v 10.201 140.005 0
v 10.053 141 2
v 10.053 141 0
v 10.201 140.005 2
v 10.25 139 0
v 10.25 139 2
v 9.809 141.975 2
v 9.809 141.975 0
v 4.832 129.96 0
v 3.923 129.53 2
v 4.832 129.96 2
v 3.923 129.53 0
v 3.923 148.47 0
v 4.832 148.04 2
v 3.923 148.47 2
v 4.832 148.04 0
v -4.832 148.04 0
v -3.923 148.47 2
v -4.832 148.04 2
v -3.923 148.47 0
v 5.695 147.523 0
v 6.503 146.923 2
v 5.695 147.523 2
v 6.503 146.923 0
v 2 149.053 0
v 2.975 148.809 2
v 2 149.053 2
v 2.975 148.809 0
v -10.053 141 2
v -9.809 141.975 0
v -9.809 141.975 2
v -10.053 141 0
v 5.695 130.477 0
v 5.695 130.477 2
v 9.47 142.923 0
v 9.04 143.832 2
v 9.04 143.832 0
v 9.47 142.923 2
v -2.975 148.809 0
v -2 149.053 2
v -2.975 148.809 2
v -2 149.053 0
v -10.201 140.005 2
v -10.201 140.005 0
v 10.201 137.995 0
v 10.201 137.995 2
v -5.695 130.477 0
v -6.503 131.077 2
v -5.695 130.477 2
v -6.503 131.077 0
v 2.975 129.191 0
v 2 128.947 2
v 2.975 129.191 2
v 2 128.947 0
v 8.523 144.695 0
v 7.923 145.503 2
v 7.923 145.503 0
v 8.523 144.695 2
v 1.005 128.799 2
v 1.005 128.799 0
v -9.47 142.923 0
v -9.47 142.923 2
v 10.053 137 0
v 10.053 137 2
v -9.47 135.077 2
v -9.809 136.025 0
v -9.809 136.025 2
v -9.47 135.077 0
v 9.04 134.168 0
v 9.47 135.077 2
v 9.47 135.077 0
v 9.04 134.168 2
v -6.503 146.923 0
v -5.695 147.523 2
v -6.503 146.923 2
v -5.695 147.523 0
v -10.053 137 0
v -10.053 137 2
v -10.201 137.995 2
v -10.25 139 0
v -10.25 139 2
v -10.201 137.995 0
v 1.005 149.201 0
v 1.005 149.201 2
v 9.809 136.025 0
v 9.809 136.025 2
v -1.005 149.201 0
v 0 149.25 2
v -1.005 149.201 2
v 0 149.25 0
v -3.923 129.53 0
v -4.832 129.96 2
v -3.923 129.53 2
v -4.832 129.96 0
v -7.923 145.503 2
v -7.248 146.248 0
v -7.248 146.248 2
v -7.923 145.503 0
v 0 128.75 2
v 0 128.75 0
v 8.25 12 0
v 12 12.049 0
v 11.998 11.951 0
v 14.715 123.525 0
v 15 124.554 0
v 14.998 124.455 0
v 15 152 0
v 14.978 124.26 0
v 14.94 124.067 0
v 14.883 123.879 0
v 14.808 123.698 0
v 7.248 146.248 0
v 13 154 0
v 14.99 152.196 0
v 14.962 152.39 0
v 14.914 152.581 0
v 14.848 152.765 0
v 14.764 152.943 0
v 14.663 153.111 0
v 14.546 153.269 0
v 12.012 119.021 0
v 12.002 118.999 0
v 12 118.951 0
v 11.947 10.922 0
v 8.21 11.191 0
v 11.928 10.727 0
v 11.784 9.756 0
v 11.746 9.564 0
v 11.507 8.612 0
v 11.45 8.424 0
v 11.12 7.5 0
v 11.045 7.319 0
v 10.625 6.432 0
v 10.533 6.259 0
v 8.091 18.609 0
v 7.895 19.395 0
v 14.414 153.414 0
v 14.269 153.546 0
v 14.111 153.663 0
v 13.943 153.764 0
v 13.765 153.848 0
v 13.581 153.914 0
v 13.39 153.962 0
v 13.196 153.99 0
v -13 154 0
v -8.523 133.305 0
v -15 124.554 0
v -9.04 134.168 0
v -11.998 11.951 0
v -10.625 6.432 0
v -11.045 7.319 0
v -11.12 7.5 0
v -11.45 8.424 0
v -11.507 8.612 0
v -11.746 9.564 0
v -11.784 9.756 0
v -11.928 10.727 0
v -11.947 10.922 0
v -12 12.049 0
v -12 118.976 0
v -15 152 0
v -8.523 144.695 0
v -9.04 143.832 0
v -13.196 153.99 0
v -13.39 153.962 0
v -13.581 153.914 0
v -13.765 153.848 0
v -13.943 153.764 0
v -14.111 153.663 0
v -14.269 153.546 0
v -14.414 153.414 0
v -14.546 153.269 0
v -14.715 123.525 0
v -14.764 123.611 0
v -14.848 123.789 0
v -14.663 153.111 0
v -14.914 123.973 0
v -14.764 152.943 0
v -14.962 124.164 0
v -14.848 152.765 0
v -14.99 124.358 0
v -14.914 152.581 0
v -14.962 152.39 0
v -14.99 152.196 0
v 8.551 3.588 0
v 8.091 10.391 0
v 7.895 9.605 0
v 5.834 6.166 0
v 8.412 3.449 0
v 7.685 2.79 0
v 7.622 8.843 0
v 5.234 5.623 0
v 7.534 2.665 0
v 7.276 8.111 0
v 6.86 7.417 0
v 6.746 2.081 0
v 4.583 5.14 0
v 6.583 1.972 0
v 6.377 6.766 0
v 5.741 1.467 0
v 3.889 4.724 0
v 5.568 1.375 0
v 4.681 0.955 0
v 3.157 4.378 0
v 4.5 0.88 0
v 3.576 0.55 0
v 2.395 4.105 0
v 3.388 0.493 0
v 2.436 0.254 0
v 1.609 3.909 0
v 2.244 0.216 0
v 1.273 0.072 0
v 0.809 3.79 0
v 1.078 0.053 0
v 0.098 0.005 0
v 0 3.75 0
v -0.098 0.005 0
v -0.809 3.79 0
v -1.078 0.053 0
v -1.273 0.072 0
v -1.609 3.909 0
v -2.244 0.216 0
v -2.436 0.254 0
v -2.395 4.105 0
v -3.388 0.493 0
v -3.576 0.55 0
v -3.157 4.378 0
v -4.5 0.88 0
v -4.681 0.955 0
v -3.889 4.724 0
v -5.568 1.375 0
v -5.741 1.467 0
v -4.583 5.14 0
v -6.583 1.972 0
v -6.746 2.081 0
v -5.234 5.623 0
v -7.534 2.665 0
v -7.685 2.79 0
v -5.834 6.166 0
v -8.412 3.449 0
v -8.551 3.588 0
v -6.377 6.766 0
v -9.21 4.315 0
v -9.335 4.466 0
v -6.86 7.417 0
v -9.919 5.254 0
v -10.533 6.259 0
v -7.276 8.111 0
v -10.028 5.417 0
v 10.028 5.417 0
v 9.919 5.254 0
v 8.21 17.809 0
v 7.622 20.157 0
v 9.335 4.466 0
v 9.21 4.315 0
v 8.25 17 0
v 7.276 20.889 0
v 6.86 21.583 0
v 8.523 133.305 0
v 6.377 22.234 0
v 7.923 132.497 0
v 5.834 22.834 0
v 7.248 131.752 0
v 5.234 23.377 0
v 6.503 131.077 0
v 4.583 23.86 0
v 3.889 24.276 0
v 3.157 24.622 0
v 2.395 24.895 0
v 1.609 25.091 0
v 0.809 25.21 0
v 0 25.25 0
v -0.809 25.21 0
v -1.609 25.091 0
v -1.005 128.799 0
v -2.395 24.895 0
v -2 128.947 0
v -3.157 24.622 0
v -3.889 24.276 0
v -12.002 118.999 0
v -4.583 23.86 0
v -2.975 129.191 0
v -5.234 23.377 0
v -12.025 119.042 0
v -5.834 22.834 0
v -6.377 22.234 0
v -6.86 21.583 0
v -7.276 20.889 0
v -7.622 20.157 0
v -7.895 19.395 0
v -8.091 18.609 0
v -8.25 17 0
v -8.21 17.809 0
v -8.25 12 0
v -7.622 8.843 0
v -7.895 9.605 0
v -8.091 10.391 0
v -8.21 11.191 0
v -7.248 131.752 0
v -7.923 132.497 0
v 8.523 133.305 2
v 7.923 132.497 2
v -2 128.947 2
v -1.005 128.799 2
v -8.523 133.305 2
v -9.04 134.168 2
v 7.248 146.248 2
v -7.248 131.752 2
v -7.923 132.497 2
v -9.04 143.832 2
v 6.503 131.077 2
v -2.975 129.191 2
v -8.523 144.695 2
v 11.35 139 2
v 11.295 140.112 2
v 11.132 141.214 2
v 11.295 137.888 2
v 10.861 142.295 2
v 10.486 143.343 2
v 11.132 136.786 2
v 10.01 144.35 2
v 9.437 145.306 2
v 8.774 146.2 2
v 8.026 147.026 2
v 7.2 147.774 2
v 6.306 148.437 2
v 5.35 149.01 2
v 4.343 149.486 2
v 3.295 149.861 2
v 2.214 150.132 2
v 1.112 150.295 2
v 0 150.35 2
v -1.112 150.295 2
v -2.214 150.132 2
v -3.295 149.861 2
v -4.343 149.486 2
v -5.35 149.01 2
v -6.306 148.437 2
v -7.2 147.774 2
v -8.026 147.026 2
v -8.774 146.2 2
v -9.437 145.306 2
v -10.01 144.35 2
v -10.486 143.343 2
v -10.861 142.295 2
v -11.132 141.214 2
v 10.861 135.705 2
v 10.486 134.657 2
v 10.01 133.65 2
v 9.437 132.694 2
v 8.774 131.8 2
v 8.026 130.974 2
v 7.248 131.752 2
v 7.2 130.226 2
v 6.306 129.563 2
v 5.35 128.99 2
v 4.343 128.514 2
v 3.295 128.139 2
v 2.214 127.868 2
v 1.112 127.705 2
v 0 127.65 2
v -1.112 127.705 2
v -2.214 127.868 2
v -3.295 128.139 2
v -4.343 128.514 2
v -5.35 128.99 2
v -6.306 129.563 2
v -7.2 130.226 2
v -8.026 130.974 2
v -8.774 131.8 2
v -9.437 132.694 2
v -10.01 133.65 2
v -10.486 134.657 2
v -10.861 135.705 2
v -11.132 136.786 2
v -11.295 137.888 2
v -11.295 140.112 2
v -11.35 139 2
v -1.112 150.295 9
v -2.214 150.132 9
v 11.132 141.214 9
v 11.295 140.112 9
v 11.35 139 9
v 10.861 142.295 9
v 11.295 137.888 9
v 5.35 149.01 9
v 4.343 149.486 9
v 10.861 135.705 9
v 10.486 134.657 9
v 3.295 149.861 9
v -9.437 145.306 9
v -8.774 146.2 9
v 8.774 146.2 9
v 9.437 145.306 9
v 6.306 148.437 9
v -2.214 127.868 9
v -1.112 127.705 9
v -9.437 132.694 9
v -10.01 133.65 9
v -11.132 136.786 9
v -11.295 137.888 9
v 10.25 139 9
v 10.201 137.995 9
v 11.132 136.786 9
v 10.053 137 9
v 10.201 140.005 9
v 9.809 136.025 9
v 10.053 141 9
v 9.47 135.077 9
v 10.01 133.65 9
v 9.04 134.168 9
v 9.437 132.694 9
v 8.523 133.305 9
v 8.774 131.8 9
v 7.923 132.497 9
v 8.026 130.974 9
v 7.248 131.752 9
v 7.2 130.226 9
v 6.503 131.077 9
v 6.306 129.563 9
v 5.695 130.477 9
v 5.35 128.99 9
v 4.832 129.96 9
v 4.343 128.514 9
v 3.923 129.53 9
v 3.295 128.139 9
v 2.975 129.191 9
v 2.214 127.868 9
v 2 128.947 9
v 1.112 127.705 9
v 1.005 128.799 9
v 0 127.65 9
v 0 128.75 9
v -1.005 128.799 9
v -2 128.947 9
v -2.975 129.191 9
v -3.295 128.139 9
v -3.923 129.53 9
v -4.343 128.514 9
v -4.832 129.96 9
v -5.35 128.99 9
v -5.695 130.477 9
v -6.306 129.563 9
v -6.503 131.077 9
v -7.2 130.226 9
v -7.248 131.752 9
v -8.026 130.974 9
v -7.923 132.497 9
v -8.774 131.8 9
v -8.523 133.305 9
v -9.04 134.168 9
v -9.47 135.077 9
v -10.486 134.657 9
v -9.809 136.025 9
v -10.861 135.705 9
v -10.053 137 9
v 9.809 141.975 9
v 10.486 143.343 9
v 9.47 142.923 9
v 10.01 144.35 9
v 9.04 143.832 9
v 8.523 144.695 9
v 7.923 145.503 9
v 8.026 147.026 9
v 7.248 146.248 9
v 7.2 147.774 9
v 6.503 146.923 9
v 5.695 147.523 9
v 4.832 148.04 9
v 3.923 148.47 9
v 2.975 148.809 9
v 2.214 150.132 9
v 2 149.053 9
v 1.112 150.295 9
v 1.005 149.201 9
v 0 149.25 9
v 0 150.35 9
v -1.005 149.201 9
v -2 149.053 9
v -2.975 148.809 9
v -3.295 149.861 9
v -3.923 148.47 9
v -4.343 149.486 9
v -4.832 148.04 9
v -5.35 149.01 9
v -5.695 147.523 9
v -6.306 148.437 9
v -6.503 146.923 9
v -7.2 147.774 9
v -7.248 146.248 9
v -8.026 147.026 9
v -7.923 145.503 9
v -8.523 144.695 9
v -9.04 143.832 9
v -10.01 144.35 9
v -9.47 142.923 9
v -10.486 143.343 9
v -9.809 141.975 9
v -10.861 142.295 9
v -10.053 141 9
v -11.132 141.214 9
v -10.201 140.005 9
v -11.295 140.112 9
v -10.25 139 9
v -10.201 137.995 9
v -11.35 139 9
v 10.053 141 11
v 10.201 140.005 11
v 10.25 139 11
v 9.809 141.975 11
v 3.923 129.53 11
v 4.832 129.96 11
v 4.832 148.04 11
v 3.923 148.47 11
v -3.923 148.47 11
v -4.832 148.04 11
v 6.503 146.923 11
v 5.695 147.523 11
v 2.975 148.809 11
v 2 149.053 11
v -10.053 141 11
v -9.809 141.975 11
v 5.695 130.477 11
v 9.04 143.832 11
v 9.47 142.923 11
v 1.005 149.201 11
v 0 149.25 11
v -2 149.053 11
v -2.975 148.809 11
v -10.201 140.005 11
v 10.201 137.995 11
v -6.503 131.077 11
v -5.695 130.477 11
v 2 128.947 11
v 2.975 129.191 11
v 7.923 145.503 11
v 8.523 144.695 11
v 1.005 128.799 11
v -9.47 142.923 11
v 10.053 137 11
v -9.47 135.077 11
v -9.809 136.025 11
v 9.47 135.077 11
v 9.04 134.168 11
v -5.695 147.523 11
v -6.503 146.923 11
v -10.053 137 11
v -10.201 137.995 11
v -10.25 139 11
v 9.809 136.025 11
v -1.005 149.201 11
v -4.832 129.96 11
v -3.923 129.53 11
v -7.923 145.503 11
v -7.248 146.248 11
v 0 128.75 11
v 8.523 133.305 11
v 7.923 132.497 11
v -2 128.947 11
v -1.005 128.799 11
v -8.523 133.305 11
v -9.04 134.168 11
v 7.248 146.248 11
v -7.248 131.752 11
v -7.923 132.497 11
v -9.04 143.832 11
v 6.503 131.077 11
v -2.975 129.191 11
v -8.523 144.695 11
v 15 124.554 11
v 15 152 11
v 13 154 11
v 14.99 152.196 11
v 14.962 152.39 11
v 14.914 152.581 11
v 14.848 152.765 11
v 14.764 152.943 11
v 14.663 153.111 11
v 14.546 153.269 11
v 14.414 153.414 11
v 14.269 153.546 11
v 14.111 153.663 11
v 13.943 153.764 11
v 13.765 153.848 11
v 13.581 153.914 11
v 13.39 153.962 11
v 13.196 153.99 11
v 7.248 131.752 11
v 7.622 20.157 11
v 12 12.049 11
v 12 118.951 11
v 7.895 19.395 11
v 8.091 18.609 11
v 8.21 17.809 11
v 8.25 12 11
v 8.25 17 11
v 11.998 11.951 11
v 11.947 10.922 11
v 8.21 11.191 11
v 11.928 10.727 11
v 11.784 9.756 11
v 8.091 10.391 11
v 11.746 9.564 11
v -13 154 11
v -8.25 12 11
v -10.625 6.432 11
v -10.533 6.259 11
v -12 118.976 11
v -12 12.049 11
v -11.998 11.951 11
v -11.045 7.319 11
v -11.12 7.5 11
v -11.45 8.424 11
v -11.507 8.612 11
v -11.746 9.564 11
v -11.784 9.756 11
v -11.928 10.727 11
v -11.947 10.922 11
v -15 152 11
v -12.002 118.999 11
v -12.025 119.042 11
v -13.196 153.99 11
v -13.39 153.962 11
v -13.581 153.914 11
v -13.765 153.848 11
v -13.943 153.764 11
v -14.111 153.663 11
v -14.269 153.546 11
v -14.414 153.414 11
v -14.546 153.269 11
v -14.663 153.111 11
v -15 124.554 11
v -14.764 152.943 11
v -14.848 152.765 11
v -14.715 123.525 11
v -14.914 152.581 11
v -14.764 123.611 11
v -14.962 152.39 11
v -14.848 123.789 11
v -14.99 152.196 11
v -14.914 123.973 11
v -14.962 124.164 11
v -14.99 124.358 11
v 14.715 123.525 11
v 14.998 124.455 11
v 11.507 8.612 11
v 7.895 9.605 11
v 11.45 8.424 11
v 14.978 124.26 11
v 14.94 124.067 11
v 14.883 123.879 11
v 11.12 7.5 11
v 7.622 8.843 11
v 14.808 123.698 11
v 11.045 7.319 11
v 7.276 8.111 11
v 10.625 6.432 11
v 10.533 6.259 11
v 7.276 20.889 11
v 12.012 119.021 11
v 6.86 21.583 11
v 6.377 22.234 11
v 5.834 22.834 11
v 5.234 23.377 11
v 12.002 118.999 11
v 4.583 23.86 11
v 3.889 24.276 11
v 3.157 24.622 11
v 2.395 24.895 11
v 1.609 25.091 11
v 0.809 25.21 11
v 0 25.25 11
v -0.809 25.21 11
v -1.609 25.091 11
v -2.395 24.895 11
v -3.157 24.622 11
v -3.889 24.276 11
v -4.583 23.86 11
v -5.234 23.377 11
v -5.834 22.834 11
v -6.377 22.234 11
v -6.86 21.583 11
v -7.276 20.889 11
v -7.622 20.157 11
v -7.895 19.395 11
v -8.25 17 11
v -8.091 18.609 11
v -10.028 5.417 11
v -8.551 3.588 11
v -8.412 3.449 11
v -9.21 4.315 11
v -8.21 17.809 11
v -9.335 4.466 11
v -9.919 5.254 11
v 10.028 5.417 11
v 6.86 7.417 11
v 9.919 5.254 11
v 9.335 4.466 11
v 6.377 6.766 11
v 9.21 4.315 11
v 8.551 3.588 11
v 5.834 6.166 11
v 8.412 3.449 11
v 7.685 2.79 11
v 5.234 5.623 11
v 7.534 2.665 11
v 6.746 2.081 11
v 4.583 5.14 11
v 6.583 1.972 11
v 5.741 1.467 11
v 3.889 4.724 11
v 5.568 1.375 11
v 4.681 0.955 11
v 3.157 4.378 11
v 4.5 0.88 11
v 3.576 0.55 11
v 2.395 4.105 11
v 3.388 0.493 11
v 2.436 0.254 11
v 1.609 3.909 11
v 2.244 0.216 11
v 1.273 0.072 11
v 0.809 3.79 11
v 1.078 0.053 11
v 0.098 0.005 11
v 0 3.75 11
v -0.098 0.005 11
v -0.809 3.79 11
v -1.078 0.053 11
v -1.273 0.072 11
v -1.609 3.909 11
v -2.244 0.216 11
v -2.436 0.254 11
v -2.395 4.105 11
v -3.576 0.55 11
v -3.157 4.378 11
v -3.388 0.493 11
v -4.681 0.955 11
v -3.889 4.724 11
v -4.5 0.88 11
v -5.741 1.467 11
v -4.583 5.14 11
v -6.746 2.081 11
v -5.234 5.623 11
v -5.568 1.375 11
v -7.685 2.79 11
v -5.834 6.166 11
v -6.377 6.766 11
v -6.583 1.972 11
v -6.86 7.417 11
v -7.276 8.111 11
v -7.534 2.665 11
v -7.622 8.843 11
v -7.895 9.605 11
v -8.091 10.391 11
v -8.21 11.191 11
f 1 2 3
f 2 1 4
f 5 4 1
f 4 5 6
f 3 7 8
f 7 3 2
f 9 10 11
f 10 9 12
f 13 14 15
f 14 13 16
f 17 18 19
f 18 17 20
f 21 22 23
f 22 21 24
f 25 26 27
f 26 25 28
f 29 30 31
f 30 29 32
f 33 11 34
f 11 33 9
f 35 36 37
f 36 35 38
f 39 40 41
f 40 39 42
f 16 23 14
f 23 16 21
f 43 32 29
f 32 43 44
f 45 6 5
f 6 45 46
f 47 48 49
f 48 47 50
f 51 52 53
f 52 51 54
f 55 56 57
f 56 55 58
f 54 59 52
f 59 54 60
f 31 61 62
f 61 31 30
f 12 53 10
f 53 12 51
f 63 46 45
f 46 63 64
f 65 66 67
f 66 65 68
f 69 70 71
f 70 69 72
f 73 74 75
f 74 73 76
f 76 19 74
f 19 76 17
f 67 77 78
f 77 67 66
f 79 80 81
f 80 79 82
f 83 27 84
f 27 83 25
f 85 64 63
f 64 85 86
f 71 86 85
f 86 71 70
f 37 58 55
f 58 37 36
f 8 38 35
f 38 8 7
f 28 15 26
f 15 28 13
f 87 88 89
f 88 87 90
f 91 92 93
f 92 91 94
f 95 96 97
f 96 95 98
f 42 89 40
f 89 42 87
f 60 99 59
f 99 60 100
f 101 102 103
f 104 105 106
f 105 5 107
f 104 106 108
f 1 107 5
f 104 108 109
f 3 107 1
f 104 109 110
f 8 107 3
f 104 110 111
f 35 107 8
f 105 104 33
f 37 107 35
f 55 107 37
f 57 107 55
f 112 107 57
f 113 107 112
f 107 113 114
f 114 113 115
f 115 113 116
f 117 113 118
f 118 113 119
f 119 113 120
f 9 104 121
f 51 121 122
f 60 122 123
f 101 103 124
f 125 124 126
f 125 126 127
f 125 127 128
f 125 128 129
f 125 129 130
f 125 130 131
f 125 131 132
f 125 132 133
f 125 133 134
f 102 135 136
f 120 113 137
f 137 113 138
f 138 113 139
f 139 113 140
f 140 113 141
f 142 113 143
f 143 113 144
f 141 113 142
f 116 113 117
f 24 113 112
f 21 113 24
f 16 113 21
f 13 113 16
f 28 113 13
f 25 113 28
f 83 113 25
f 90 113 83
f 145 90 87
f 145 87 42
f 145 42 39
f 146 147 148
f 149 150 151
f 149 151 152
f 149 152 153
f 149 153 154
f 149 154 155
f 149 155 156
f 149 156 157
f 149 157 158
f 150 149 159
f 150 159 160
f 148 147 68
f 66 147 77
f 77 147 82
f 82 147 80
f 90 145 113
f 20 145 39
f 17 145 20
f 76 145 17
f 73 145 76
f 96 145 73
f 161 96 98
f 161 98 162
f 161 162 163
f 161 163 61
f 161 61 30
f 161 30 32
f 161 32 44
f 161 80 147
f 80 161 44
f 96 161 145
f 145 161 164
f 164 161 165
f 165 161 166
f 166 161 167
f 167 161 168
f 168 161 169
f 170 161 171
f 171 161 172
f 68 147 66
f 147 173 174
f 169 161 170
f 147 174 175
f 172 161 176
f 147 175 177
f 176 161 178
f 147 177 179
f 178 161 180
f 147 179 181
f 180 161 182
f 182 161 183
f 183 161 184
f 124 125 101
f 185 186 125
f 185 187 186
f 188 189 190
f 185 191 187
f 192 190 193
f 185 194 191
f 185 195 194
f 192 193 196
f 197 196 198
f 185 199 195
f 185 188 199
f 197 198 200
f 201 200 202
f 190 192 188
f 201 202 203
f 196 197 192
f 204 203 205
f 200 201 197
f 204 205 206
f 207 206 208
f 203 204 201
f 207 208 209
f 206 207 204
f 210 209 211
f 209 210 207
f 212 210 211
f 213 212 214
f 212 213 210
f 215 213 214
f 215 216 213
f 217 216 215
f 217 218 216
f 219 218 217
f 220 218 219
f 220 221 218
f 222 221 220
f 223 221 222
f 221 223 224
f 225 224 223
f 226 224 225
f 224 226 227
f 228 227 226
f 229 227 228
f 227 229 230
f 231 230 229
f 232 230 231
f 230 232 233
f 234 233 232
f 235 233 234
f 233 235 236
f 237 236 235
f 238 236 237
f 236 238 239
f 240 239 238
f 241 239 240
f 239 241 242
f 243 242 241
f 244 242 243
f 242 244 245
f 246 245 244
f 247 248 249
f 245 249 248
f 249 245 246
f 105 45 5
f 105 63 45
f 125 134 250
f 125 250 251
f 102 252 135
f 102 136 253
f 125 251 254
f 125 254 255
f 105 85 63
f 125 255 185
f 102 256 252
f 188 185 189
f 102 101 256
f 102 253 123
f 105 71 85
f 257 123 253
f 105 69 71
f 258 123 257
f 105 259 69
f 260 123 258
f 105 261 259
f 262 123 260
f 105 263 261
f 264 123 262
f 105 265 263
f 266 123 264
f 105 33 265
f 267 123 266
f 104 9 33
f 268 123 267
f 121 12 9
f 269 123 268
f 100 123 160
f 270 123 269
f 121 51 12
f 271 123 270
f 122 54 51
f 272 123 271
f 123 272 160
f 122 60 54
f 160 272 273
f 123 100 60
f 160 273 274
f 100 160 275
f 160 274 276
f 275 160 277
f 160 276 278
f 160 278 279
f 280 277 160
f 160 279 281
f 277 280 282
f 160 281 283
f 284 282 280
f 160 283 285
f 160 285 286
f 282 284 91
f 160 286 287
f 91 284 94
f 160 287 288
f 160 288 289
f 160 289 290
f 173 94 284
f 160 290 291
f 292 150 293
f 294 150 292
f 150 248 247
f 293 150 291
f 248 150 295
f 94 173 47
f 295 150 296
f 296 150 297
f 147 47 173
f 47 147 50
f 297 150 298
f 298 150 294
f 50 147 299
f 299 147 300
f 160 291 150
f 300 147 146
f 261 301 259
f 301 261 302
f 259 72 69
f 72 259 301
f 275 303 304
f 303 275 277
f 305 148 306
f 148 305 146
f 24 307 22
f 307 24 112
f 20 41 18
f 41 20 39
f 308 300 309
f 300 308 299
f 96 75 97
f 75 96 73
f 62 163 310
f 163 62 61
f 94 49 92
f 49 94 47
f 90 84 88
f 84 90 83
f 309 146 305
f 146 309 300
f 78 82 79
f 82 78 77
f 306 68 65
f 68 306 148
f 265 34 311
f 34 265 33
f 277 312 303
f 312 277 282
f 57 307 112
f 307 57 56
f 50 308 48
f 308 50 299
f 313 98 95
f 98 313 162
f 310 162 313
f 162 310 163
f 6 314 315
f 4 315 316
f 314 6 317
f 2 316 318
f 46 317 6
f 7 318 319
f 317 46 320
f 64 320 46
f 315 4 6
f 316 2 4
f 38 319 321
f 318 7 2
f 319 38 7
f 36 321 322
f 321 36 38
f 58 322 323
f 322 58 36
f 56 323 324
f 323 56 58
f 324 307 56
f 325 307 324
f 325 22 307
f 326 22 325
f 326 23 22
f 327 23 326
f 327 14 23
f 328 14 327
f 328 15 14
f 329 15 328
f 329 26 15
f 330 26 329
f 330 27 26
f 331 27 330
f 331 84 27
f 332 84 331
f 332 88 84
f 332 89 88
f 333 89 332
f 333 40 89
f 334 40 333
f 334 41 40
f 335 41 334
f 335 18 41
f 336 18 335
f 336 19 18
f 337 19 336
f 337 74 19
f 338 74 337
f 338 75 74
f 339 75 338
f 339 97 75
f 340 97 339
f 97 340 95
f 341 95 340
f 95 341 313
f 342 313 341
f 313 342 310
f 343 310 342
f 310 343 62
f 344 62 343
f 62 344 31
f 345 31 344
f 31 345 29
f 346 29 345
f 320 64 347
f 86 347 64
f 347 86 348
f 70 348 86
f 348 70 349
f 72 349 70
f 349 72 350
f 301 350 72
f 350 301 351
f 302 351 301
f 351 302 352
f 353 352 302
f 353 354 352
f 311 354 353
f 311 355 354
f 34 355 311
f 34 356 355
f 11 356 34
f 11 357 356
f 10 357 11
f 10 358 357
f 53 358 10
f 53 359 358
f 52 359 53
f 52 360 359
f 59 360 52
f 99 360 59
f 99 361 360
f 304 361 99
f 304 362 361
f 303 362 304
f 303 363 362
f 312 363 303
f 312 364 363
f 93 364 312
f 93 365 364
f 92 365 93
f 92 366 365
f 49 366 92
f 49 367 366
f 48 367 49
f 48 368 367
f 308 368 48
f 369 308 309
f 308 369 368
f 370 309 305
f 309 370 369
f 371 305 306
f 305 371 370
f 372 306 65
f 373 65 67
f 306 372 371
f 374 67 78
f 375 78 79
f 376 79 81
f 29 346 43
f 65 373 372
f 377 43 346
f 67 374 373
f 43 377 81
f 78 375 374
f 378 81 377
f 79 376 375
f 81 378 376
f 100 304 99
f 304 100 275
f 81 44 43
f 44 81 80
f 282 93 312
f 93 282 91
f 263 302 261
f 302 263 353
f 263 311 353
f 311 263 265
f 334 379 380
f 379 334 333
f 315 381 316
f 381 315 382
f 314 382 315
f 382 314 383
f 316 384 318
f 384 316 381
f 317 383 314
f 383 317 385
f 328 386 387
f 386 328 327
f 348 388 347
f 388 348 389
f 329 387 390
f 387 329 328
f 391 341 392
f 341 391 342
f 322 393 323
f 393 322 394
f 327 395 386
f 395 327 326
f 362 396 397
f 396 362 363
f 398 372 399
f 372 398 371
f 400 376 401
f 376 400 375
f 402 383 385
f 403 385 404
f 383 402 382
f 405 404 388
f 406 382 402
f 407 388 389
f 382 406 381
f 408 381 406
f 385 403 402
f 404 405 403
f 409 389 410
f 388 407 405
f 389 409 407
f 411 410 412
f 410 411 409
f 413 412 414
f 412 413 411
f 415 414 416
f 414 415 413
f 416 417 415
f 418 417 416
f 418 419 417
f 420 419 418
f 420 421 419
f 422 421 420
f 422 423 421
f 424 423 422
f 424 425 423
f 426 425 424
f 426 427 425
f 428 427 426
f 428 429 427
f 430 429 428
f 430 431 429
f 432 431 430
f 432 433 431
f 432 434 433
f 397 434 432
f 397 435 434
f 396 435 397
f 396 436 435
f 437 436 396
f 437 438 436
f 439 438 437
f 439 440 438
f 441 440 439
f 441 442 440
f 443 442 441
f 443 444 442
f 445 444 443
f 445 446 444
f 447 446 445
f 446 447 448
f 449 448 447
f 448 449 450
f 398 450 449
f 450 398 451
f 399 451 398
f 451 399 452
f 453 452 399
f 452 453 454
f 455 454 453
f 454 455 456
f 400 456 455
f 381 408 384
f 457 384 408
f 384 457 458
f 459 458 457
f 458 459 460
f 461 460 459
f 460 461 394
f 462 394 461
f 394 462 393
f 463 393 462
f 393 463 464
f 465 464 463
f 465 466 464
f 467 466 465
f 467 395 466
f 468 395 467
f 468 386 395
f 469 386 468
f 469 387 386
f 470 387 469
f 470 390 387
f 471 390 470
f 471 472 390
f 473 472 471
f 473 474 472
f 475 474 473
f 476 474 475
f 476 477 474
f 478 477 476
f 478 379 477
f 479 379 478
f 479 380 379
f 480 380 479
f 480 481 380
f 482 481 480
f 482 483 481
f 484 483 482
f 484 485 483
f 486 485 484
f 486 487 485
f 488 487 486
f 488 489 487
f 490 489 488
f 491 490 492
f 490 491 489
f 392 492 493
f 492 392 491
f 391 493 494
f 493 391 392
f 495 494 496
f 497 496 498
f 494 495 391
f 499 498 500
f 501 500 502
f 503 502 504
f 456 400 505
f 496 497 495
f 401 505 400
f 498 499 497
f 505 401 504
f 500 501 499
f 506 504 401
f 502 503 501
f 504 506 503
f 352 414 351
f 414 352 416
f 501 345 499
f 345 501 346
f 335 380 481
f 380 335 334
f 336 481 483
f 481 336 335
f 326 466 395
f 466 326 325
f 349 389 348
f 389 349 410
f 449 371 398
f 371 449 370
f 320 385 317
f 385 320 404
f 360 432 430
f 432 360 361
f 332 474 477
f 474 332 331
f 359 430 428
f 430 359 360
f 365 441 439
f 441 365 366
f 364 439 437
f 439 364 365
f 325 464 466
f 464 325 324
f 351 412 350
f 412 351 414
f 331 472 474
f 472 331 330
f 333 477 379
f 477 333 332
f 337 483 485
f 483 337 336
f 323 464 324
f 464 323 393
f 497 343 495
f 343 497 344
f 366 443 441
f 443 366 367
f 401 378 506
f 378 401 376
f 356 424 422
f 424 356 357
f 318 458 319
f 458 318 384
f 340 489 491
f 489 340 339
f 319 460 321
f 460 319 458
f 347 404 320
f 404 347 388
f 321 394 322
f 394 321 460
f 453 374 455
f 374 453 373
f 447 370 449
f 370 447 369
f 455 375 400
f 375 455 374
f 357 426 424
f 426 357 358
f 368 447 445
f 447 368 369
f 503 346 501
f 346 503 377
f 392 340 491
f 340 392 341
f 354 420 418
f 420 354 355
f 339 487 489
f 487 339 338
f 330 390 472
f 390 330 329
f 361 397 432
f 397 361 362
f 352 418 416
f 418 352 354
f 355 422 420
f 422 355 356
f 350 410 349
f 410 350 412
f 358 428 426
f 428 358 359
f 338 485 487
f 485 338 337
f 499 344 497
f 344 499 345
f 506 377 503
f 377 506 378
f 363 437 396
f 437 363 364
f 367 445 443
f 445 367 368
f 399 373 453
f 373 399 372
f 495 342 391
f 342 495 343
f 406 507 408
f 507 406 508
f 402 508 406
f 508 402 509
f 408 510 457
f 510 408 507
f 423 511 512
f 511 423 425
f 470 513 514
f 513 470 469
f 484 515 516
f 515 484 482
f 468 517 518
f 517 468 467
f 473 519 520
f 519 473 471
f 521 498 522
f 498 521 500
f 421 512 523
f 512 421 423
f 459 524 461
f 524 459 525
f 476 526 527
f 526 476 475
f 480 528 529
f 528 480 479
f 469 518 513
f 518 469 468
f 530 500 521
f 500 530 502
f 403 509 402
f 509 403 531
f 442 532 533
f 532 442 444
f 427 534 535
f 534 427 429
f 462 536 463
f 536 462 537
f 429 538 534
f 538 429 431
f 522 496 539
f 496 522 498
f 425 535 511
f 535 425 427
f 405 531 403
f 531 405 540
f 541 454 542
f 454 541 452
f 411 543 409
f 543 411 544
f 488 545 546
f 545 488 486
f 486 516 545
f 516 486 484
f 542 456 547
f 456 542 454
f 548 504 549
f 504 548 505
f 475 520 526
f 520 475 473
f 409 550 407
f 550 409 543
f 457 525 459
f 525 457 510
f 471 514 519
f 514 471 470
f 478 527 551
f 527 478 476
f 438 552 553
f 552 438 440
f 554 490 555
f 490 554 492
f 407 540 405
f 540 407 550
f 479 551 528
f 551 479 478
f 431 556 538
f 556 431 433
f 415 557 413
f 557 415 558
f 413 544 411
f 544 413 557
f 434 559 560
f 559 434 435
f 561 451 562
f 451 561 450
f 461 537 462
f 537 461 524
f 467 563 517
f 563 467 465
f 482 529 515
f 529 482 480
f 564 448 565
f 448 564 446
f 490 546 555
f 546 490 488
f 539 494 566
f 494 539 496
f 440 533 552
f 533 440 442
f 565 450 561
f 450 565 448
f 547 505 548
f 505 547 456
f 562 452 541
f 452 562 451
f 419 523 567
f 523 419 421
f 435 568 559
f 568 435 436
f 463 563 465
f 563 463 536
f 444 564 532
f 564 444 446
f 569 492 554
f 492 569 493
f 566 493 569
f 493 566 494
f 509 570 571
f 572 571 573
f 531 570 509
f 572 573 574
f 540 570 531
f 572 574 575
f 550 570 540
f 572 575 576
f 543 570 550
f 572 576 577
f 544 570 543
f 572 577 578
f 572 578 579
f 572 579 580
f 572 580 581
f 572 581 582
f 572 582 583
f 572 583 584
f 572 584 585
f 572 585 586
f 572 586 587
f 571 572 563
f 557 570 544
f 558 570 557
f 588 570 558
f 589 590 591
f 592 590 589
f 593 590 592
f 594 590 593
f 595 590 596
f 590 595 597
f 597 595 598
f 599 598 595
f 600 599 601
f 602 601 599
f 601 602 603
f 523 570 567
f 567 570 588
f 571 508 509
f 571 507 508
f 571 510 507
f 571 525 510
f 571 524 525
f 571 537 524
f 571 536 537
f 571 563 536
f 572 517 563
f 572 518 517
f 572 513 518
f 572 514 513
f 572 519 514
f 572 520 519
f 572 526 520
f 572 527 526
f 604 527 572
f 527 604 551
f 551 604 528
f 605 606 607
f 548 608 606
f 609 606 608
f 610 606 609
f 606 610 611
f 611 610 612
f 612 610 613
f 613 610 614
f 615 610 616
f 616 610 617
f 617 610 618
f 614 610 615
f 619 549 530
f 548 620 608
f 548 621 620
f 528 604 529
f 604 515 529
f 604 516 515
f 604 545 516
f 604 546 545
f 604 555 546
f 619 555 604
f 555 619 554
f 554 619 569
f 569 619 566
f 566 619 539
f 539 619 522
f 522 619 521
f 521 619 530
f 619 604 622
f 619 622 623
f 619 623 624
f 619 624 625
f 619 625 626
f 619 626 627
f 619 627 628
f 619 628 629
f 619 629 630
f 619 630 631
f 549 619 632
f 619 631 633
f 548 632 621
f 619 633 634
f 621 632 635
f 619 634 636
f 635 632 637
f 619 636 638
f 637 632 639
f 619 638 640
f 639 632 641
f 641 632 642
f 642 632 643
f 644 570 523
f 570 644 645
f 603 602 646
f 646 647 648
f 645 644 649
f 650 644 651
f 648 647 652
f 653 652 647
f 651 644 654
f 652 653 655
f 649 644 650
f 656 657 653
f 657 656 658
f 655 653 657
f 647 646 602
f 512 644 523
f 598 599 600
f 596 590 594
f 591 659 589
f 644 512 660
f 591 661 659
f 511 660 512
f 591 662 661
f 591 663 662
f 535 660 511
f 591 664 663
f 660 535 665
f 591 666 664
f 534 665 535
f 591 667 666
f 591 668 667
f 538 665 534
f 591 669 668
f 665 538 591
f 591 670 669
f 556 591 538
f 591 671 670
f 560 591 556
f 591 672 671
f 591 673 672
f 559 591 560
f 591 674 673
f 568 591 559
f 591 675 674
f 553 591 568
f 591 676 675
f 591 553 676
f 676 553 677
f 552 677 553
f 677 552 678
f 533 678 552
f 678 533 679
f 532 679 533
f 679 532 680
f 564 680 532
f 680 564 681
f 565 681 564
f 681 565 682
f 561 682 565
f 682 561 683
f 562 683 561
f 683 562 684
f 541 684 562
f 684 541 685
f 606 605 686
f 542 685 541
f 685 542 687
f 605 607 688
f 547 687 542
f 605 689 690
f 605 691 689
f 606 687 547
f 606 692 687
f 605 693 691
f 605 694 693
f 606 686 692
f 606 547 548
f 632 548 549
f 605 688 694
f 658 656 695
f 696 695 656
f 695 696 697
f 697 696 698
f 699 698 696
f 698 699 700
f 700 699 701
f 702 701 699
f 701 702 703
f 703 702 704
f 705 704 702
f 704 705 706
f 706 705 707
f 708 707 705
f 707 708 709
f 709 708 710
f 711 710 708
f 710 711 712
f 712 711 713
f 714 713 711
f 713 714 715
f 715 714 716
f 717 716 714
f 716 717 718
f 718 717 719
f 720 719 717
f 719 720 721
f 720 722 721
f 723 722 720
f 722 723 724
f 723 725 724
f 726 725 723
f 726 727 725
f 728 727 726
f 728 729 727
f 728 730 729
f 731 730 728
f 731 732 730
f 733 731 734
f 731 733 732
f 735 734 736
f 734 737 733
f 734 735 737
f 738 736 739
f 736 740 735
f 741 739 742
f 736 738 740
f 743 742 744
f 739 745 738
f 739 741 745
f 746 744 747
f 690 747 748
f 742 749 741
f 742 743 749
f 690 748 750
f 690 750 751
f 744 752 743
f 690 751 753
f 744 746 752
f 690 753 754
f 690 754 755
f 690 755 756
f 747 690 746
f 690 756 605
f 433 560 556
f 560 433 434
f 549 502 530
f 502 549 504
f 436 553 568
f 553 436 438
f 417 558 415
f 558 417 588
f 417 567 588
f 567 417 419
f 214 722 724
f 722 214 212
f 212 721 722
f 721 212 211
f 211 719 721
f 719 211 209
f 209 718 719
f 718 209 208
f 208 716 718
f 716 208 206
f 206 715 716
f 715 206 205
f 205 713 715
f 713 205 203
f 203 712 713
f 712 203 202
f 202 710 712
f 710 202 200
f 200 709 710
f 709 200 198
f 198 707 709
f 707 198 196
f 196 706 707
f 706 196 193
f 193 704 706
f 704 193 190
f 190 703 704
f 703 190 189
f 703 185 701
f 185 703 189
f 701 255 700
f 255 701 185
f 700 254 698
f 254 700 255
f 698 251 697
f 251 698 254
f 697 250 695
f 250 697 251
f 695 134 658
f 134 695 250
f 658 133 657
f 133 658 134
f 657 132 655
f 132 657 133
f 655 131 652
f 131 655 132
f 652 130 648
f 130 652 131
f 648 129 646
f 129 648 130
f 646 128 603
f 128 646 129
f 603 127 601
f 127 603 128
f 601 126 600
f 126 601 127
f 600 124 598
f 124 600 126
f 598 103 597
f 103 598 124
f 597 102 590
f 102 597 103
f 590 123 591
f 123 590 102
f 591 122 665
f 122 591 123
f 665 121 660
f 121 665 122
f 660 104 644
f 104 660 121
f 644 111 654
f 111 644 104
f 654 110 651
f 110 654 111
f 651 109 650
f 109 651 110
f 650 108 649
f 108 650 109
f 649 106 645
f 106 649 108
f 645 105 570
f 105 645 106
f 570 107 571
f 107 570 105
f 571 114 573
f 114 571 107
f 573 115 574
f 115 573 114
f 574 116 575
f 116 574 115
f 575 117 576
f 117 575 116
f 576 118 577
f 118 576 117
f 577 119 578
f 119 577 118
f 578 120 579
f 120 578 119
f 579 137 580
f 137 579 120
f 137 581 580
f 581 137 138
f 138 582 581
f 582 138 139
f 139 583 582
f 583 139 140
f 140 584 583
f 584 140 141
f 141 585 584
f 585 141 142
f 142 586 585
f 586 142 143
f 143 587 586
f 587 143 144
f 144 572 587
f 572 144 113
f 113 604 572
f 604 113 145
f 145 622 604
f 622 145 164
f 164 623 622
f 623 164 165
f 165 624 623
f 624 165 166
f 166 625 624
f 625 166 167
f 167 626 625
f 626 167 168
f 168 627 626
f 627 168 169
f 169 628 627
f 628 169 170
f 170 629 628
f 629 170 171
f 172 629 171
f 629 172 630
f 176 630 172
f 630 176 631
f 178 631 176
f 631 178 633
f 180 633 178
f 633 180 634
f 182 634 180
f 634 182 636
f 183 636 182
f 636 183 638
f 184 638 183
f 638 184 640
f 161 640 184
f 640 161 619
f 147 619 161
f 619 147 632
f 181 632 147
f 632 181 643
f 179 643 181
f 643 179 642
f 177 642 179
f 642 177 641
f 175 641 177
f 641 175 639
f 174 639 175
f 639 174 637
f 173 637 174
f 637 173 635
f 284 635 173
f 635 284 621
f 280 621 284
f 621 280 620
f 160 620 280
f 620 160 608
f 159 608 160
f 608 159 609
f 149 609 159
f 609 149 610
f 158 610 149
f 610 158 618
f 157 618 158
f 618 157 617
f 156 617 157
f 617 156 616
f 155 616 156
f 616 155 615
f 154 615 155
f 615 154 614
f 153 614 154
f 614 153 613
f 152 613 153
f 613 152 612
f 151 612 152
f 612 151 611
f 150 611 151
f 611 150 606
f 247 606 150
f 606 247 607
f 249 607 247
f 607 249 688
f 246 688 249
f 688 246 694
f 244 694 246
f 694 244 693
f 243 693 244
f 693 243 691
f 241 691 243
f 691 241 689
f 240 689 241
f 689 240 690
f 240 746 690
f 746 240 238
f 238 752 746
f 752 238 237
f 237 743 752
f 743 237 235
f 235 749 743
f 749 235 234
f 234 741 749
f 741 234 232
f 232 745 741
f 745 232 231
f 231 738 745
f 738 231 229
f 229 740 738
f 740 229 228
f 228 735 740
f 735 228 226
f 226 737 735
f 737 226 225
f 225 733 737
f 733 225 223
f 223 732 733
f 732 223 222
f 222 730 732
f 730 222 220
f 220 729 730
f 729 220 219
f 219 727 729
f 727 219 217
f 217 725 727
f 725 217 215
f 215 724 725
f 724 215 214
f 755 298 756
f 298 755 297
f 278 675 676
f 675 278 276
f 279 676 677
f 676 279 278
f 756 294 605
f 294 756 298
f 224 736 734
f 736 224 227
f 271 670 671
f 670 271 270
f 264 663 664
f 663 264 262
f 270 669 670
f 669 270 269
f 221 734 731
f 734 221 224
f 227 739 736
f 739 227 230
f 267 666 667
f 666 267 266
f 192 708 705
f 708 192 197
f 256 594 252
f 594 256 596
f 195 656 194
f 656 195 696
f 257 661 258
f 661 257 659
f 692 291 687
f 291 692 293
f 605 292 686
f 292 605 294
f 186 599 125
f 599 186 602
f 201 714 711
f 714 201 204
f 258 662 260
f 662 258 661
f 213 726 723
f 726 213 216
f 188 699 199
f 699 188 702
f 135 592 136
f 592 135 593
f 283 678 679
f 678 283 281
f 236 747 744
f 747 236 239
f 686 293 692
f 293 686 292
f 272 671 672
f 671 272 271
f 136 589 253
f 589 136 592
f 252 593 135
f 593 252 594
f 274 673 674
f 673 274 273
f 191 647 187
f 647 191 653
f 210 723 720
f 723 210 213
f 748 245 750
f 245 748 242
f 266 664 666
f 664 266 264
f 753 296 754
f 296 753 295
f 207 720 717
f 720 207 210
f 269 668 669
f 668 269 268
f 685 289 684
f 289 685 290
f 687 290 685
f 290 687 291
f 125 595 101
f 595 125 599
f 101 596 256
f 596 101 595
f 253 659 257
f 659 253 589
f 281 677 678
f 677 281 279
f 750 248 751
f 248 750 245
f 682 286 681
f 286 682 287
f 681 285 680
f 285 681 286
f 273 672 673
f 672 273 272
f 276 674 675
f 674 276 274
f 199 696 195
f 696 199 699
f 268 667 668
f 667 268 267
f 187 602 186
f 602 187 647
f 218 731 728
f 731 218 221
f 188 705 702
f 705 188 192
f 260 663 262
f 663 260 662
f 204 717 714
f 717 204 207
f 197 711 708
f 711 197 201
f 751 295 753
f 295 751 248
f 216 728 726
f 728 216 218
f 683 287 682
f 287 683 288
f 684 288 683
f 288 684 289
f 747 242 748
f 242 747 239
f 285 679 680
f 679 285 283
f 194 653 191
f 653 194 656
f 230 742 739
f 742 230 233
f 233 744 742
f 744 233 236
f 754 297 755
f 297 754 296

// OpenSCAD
$fn=64;

BODY_X1=24;
BODY_X2=30;
BODY_Y=154;
BODY_Z=11;
UPPER_HOLE=16.5;

BEARING_D=22.7;
BEARING_H=7;

module smooth(r=1)
{

    offset(r=r)
    offset(r=-r)
    children();
}

union()
{
    difference()
    {

        linear_extrude(height=BODY_Z) smooth(r=2) union()
        {
            hull()
            {
                translate([0, BODY_Y - BODY_X2 - BODY_X1/2, 0]) circle(d=BODY_X1);
                translate([0, BODY_X1/2, 0]) circle(d=BODY_X1);
                
            }
            polygon([[BODY_X1/2, BODY_Y - BODY_X2 - BODY_X1/2], 
            [BODY_X1/2, BODY_Y - BODY_X2 - 5], 
            [BODY_X2/2, BODY_Y - BODY_X2], 
            [BODY_X2/2, BODY_Y], 
            [-BODY_X2/2, BODY_Y], 
            [-BODY_X2/2, BODY_Y-BODY_X2], 
            [-BODY_X1/2, BODY_Y-BODY_X2 - 5], 
            [-BODY_X1/2, BODY_Y-BODY_X2 - BODY_X1/2]]);
        }

        translate([0, BODY_X1/2, 0]) linear_extrude(height=BODY_Z) hull()
        {
            translate([0, 5, 0]) circle(d=UPPER_HOLE);
            circle(d=UPPER_HOLE);
        }

        translate([0, 139, 0]) 
        {
            union()
            {
                cylinder(h=(BODY_Z - BEARING_H) / 2, d=BEARING_D - 2.2);
                translate([0, 0, (BODY_Z - BEARING_H) / 2]) cylinder(h=BEARING_H, d=BEARING_D);
                translate([0, 0, (BODY_Z - BEARING_H) / 2 + BEARING_H]) cylinder(h=(BODY_Z - BEARING_H) / 2, d=BEARING_D - 2.2);
            }
        }

    }
}
